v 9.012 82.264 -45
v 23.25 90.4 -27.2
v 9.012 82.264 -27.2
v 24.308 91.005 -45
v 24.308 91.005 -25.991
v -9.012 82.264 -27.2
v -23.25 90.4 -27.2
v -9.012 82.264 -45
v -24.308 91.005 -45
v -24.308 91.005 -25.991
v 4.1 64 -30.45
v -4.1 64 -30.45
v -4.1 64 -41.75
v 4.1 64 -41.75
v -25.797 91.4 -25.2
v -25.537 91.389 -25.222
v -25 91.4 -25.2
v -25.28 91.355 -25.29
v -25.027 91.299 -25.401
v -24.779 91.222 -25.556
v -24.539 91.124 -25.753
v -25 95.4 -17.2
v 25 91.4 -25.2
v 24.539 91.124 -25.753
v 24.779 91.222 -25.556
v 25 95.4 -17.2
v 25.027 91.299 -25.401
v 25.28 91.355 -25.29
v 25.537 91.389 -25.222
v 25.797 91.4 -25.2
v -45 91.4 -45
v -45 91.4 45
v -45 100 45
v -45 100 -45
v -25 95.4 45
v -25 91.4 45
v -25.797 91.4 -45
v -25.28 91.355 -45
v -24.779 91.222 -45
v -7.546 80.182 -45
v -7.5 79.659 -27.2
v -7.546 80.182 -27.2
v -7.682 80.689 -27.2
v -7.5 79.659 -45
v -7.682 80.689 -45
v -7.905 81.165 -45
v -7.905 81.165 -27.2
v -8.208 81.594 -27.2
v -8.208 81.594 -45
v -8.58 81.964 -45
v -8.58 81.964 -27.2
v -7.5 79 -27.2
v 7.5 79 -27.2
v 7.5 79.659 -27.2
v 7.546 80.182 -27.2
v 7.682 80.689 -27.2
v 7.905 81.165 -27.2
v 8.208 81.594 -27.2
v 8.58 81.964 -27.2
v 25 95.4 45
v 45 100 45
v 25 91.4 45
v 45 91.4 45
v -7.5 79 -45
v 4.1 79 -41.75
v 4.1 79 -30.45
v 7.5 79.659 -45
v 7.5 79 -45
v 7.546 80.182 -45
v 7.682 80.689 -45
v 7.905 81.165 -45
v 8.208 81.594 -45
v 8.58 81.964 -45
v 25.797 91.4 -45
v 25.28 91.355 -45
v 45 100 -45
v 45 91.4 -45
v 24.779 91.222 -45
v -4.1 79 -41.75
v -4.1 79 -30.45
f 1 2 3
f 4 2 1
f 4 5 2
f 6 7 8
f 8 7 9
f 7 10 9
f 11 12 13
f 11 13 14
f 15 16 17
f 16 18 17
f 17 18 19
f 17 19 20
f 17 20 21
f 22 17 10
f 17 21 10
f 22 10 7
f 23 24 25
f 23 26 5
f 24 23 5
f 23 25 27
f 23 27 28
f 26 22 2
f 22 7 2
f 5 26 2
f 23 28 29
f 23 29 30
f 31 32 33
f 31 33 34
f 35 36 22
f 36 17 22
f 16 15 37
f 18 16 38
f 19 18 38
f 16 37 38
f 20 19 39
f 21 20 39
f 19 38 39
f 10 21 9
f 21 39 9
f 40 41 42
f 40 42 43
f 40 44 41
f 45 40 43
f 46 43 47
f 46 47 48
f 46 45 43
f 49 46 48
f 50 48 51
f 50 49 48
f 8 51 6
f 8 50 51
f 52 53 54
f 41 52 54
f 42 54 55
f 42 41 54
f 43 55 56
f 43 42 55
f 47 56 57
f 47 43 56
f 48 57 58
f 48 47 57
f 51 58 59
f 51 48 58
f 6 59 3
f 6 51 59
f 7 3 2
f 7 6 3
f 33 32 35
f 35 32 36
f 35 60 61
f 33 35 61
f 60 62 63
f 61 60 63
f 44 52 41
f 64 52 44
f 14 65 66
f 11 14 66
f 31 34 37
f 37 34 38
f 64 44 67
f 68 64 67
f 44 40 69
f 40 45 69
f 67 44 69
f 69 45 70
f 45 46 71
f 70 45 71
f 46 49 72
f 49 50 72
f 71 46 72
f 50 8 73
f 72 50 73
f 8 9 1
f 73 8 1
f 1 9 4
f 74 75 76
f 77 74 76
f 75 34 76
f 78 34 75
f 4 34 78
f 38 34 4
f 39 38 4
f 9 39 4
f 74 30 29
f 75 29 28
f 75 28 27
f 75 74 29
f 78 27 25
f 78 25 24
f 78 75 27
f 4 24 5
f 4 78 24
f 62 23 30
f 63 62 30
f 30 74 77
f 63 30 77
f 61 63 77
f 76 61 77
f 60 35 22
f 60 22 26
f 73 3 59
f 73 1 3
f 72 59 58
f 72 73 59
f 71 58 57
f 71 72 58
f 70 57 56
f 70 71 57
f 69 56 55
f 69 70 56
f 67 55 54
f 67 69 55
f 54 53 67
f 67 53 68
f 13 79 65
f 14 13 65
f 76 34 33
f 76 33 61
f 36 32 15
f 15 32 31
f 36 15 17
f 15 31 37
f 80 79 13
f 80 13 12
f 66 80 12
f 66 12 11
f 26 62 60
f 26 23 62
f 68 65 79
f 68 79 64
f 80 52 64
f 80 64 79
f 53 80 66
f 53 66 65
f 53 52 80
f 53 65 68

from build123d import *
from OCP.BRepFilletAPI import BRepFilletAPI_MakeChamfer

# Parameters (mm, degrees)
ESQUISSE2_W             = 90
ESQUISSE2_H             = 90
BOSS_EXTRU_1_DEPTH      = 4
ESQUISSE3_W             = 9.2
ESQUISSE3_H             = 10.3
BOSS_EXTRU_2_DEPTH      = 2.4
CONG_1_R                = 1
ESQUISSE5_W             = 14.85
ESQUISSE5_H             = 90
BOSS_EXTRU_3_DEPTH      = 2.4
ESQUISSE6_W             = 7
ESQUISSE6_H             = 5
BOSS_EXTRU_4_DEPTH      = 38
ESQUISSE8_W             = 14.85
ESQUISSE8_H             = 18
BOSS_EXTRU_5_DEPTH      = 38
BOSS_EXTRU_6_REACH      = 97.814
ESQUISSE9_W             = 7
ESQUISSE9_H             = 2
CONG_1_OF_SYM_TRIE1_R   = 1
ENL_V_MAT_EXTRU_1_REACH = 111.983
ESQUISSE10_W            = 2
ESQUISSE10_H            = 18
ENL_V_MAT_EXTRU_2_REACH = 77.38
ESQUISSE11_W            = 40
ESQUISSE11_H            = 18
BOSS_EXTRU_7_REACH      = 100.203
ESQUISSE12_W            = 5
ESQUISSE12_H            = 8.6
ESQUISSE13_W            = 6.9
ESQUISSE13_H            = 7.6
BOSS_EXTRU_8_DEPTH      = 2.45
CONG_2_R                = 1
CONG_2_OF_SYM_TRIE2_R   = 1
BOSS_EXTRU_9_DEPTH      = 3
BOSS_EXTRU_9_DEPTH_BACK = 3
ESQUISSE14_W            = 90
ESQUISSE14_H            = 17.8
ESQUISSE15_W            = 15
ESQUISSE15_H            = 17.8
BOSS_EXTRU_10_DEPTH     = 44
ESQUISSE16_W            = 90
ESQUISSE16_H            = 90
BOSS_EXTRU_11_DEPTH     = 8.6
ESQUISSE20_W            = 12
ESQUISSE20_H            = 6.4
BOSS_EXTRU_13_DEPTH     = 10
ESQUISSE21_W            = 12
ESQUISSE21_H            = 6.4
BOSS_EXTRU_14_DEPTH     = 10
CONG_3_R                = 6
ENL_V_MAT_EXTRU_4_REACH = 123.7
ESQUISSE23_R            = 2.3
CONG_3_OF_SYM_TRIE3_R   = 6
ENL_V_MAT_EXTRU_5_REACH = 123.7
ESQUISSE24_R            = 1.75
ENL_V_MAT_EXTRU_6_REACH = 135.65
ESQUISSE26_R            = 1.75
ESQUISSE27_W            = 50
ESQUISSE27_H            = 4
ENL_V_MAT_EXTRU_7_DEPTH = 72.2
CHANFREIN3_SIZE         = 28.5
CHANFREIN3_SIZE2        = 9.5
CHANFREIN4_SIZE         = 10
CHANFREIN4_SIZE2        = 17.5
CHANFREIN8_START        = -45
CHANFREIN8_DEPTH        = 17.8
CHANFREIN9_SIZE         = 3
CHANFREIN9_SIZE_2       = 9
CHANFREIN10_START       = 25.930676813
CHANFREIN10_OUTLINE_W   = 40
CHANFREIN10_OUTLINE_H   = 3.16227766
CHANFREIN10_DEPTH       = 2.069323187
CONG_9_R                = 3
ESQUISSE37_R            = 4
ENL_V_MAT_EXTRU_8_DEPTH = 3
BOSS_EXTRU_15_DEPTH     = 4.8
CONG_11_R               = 3
CHANFREIN14_SIZE        = 10
CHANFREIN14_SIZE2       = 5
ESQUISSE39_W            = 110.537037217
ESQUISSE39_H            = 103.424550411
ENL_V_MAT_EXTRU_9_DEPTH = 79
ESQUISSE40_W            = 8.2
ESQUISSE40_H            = 11.3
BOSS_EXTRU_16_DEPTH     = 15


with BuildPart() as part:
    # Esquisse2 → Boss.-Extru.1 (new body)
    with BuildSketch(Plane(origin=(0, 0, 0), x_dir=(1, 0, 0), z_dir=(0, 1, 0))):
        Rectangle(ESQUISSE2_W, ESQUISSE2_H)
    extrude(amount=BOSS_EXTRU_1_DEPTH)

    # Esquisse3 → Boss.-Extru.2 (add)
    with BuildSketch(Plane(origin=(0, 4, 0), x_dir=(1, 0, 0), z_dir=(0, 1, 0))):
        with Locations((25.55, -6)):
            Rectangle(ESQUISSE3_W, ESQUISSE3_H)
    boss_extru_2 = extrude(amount=BOSS_EXTRU_2_DEPTH)

    # Congé1
    cong_1_edges = [part.edges().sort_by_distance(p)[0] for p in [
        (20.95, 5.2, 0.85),
        (20.95, 5.2, 11.15),
    ]]
    fillet(cong_1_edges, radius=CONG_1_R)

    # Esquisse5 → Boss.-Extru.3 (add)
    with BuildSketch(Plane(origin=(0, 4, 0), x_dir=(1, 0, 0), z_dir=(0, 1, 0))):
        with Locations((37.575, 0)):
            Rectangle(ESQUISSE5_W, ESQUISSE5_H)
    boss_extru_3 = extrude(amount=BOSS_EXTRU_3_DEPTH)

    # Esquisse6 → Boss.-Extru.4 (add)
    with BuildSketch(Plane(origin=(0, 6.4, 0), x_dir=(1, 0, 0), z_dir=(0, 1, 0))):
        with Locations((33.65, -42.5)):
            Rectangle(ESQUISSE6_W, ESQUISSE6_H)
    boss_extru_4 = extrude(amount=BOSS_EXTRU_4_DEPTH)

    # Esquisse8 → Boss.-Extru.5 (add)
    with BuildSketch(Plane(origin=(0, 6.4, 0), x_dir=(1, 0, 0), z_dir=(0, 1, 0))):
        with Locations((37.575, 36)):
            Rectangle(ESQUISSE8_W, ESQUISSE8_H)
    boss_extru_5 = extrude(amount=BOSS_EXTRU_5_DEPTH)

    # Esquisse9 → Boss.-Extru.6 (add, up to next)
    with BuildSketch(Plane.XY.offset(-27), mode=Mode.PRIVATE) as boss_extru_6_sk1:
        with Locations((33.65, 43.4)):
            Rectangle(ESQUISSE9_W, ESQUISSE9_H)
    boss_extru_6_tool1 = extrude(boss_extru_6_sk1.sketch, amount=BOSS_EXTRU_6_REACH, mode=Mode.PRIVATE) - part.part
    boss_extru_6 = boss_extru_6_tool1.solids().sort_by_distance((33.65, 43.4, -27))[0]
    add(boss_extru_6)

    # Symétrie1: Boss.-Extru.2, Boss.-Extru.3, Boss.-Extru.4, Boss.-Extru.5, Boss.-Extru.6 across plane
    add(boss_extru_2.mirror(Plane(origin=(0, 0, 0), x_dir=(0, 0, 1), z_dir=(1, 0, 0))))
    add(boss_extru_3.mirror(Plane(origin=(0, 0, 0), x_dir=(0, 0, 1), z_dir=(1, 0, 0))))
    add(boss_extru_4.mirror(Plane(origin=(0, 0, 0), x_dir=(0, 0, 1), z_dir=(1, 0, 0))))
    add(boss_extru_5.mirror(Plane(origin=(0, 0, 0), x_dir=(0, 0, 1), z_dir=(1, 0, 0))))
    add(boss_extru_6.mirror(Plane(origin=(0, 0, 0), x_dir=(0, 0, 1), z_dir=(1, 0, 0))))

    # Congé1 of Symétrie1
    cong_1_of_sym_trie1_edges = [part.edges().sort_by_distance(p)[0] for p in [
        (-20.95, 5.2, 0.85),
        (-20.95, 5.2, 11.15),
    ]]
    fillet(cong_1_of_sym_trie1_edges, radius=CONG_1_OF_SYM_TRIE1_R)

    # Esquisse10 → Enlèv. mat.-Extru.1 (cut, up to next)
    with BuildSketch(Plane.XY.offset(45), mode=Mode.PRIVATE) as enl_v_mat_extru_1_sk1:
        with Locations((-31.15, 26.85)):
            Rectangle(ESQUISSE10_W, ESQUISSE10_H)
    enl_v_mat_extru_1_tool1 = extrude(enl_v_mat_extru_1_sk1.sketch, amount=-ENL_V_MAT_EXTRU_1_REACH, mode=Mode.PRIVATE) & part.part
    add(enl_v_mat_extru_1_tool1.solids().sort_by_distance((-31.15, 26.85, 45))[0], mode=Mode.SUBTRACT)

    # Esquisse11 → Enlèv. mat.-Extru.2 (cut, up to next)
    with BuildSketch(Plane(origin=(0, 4, 0), x_dir=(1, 0, 0), z_dir=(0, 1, 0)), mode=Mode.PRIVATE) as enl_v_mat_extru_2_sk1:
        with Locations((0, 36)):
            Rectangle(ESQUISSE11_W, ESQUISSE11_H)
    enl_v_mat_extru_2_tool1 = extrude(enl_v_mat_extru_2_sk1.sketch, amount=-ENL_V_MAT_EXTRU_2_REACH, mode=Mode.PRIVATE) & part.part
    add(enl_v_mat_extru_2_tool1.solids().sort_by_distance((0, 4, -36))[0], mode=Mode.SUBTRACT)

    # Esquisse12 → Boss.-Extru.7 (add, up to next)
    with BuildSketch(Plane(origin=(-30.15, 0, 0), x_dir=(0, 0, -1), z_dir=(1, 0, 0)), mode=Mode.PRIVATE) as boss_extru_7_sk1:
        with Locations((29.5, 29.34)):
            Rectangle(ESQUISSE12_W, ESQUISSE12_H)
    boss_extru_7_tool1 = extrude(boss_extru_7_sk1.sketch, amount=BOSS_EXTRU_7_REACH, mode=Mode.PRIVATE) - part.part
    add(boss_extru_7_tool1.solids().sort_by_distance((-30.15, 29.34, -29.5))[0])

    # Esquisse13 → Boss.-Extru.8 (add)
    with BuildSketch(Plane.XY.offset(-27)):
        with Locations((24.4, 29.84)):
            Rectangle(ESQUISSE13_W, ESQUISSE13_H)
    boss_extru_8 = extrude(amount=BOSS_EXTRU_8_DEPTH)

    # Congé2
    cong_2_edges = [part.edges().sort_by_distance(p)[0] for p in [
        (20.95, 33.64, -25.775),
        (20.95, 26.04, -25.775),
    ]]
    fillet(cong_2_edges, radius=CONG_2_R)

    # Symétrie2: Boss.-Extru.8 across plane
    add(boss_extru_8.mirror(Plane(origin=(0, 0, 0), x_dir=(0, 0, 1), z_dir=(1, 0, 0))))

    # Congé2 of Symétrie2
    cong_2_of_sym_trie2_edges = [part.edges().sort_by_distance(p)[0] for p in [
        (-20.95, 33.64, -25.775),
        (-20.95, 26.04, -25.775),
    ]]
    fillet(cong_2_of_sym_trie2_edges, radius=CONG_2_OF_SYM_TRIE2_R)

    # Esquisse14 → Boss.-Extru.9 (add, two sides: drawn at the far end of the back side and taken through both)
    with BuildSketch(Plane(origin=(0, 44.4, 0), x_dir=(1, 0, 0), z_dir=(0, 1, 0)).offset(-BOSS_EXTRU_9_DEPTH_BACK)):
        with Locations((0, 36.1)):
            Rectangle(ESQUISSE14_W, ESQUISSE14_H)
    extrude(amount=BOSS_EXTRU_9_DEPTH + BOSS_EXTRU_9_DEPTH_BACK)

    # Esquisse15 → Boss.-Extru.10 (add)
    with BuildSketch(Plane(origin=(0, 47.4, 0), x_dir=(1, 0, 0), z_dir=(0, 1, 0))):
        with Locations((0, 36.1)):
            Rectangle(ESQUISSE15_W, ESQUISSE15_H)
    extrude(amount=BOSS_EXTRU_10_DEPTH)

    # Esquisse16 → Boss.-Extru.11 (add)
    with BuildSketch(Plane(origin=(0, 91.4, 0), x_dir=(1, 0, 0), z_dir=(0, 1, 0))):
        Rectangle(ESQUISSE16_W, ESQUISSE16_H)
    extrude(amount=BOSS_EXTRU_11_DEPTH)

    # Esquisse20 → Boss.-Extru.13 (add)
    with BuildSketch(Plane(origin=(45, 0, 0), x_dir=(0, 0, -1), z_dir=(1, 0, 0))):
        with Locations((-11, 3.2)):
            Rectangle(ESQUISSE20_W, ESQUISSE20_H)
    boss_extru_13 = extrude(amount=BOSS_EXTRU_13_DEPTH)

    # Esquisse21 → Boss.-Extru.14 (add)
    with BuildSketch(Plane(origin=(0, 0, -45), x_dir=(-1, 0, 0), z_dir=(0, 0, -1))):
        with Locations((-39, 3.2)):
            Rectangle(ESQUISSE21_W, ESQUISSE21_H)
    boss_extru_14 = extrude(amount=BOSS_EXTRU_14_DEPTH)

    # Congé3
    cong_3_edges = [part.edges().sort_by_distance(p)[0] for p in [
        (33, 3.2, -55),
        (45, 3.2, -55),
        (55, 3.2, 5),
        (55, 3.2, 17),
    ]]
    fillet(cong_3_edges, radius=CONG_3_R - 0.0001)  # a hair under: the kernel refuses the full size

    # Esquisse23 → Enlèv. mat.-Extru.4 (cut, up to next)
    with BuildSketch(Plane(origin=(0, 6.4, 0), x_dir=(1, 0, 0), z_dir=(0, 1, 0)), mode=Mode.PRIVATE) as enl_v_mat_extru_4_sk1:
        with Locations(Location((50, -11, 0), (0, 0, 270))):
            Circle(ESQUISSE23_R)
    enl_v_mat_extru_4_tool1 = extrude(enl_v_mat_extru_4_sk1.sketch, amount=-ENL_V_MAT_EXTRU_4_REACH, mode=Mode.PRIVATE) & part.part
    # Esquisse23 → Enlèv. mat.-Extru.4 (cut, up to next)
    with BuildSketch(Plane(origin=(0, 6.4, 0), x_dir=(1, 0, 0), z_dir=(0, 1, 0)), mode=Mode.PRIVATE) as enl_v_mat_extru_4_sk2:
        with Locations(Location((39, 50, 0), (0, 0, 270))):
            Circle(ESQUISSE23_R)
    enl_v_mat_extru_4_tool2 = extrude(enl_v_mat_extru_4_sk2.sketch, amount=-ENL_V_MAT_EXTRU_4_REACH, mode=Mode.PRIVATE) & part.part
    enl_v_mat_extru_4_1 = enl_v_mat_extru_4_tool1.solids().sort_by_distance((50, 6.4, 11))[0]
    add(enl_v_mat_extru_4_1, mode=Mode.SUBTRACT)
    enl_v_mat_extru_4_2 = enl_v_mat_extru_4_tool2.solids().sort_by_distance((39, 6.4, -50))[0]
    add(enl_v_mat_extru_4_2, mode=Mode.SUBTRACT)
    enl_v_mat_extru_4 = enl_v_mat_extru_4_1 + enl_v_mat_extru_4_2  # Enlèv. mat.-Extru.4 as one shape, for the pattern or mirror that repeats it

    # Symétrie3: Boss.-Extru.13, Boss.-Extru.14, Enlèv. mat.-Extru.4 across plane
    add(boss_extru_13.mirror(Plane(origin=(0, 0, 0), x_dir=(0, 0, 1), z_dir=(1, 0, 0))))
    add(boss_extru_14.mirror(Plane(origin=(0, 0, 0), x_dir=(0, 0, 1), z_dir=(1, 0, 0))))
    add(enl_v_mat_extru_4.mirror(Plane(origin=(0, 0, 0), x_dir=(0, 0, 1), z_dir=(1, 0, 0))), mode=Mode.SUBTRACT)

    # Congé3 of Symétrie3
    cong_3_of_sym_trie3_edges = [part.edges().sort_by_distance(p)[0] for p in [
        (-33, 3.2, -55),
        (-45, 3.2, -55),
        (-55, 3.2, 5),
        (-55, 3.2, 17),
    ]]
    fillet(cong_3_of_sym_trie3_edges, radius=CONG_3_OF_SYM_TRIE3_R - 0.0001)  # a hair under: the kernel refuses the full size

    # Esquisse24 → Enlèv. mat.-Extru.5 (cut, up to next)
    with BuildSketch(Plane(origin=(0, 6.4, 0), x_dir=(1, 0, 0), z_dir=(0, 1, 0)), mode=Mode.PRIVATE) as enl_v_mat_extru_5_sk1:
        with Locations(Location((25.45, -6, 0), (0, 0, 270))):
            Circle(ESQUISSE24_R)
    enl_v_mat_extru_5_tool1 = extrude(enl_v_mat_extru_5_sk1.sketch, amount=-ENL_V_MAT_EXTRU_5_REACH, mode=Mode.PRIVATE) & part.part
    enl_v_mat_extru_5 = enl_v_mat_extru_5_tool1.solids().sort_by_distance((25.45, 6.4, 6))[0]
    add(enl_v_mat_extru_5, mode=Mode.SUBTRACT)

    # Esquisse26 → Enlèv. mat.-Extru.6 (cut, up to next)
    with BuildSketch(Plane.XY.offset(-24.55), mode=Mode.PRIVATE) as enl_v_mat_extru_6_sk1:
        with Locations((25.55, 28.44)):
            Circle(ESQUISSE26_R)
    enl_v_mat_extru_6_tool1 = extrude(enl_v_mat_extru_6_sk1.sketch, amount=-ENL_V_MAT_EXTRU_6_REACH, mode=Mode.PRIVATE) & part.part
    enl_v_mat_extru_6 = enl_v_mat_extru_6_tool1.solids().sort_by_distance((25.55, 28.44, -24.55))[0]
    add(enl_v_mat_extru_6, mode=Mode.SUBTRACT)

    # Symétrie5: Enlèv. mat.-Extru.5, Enlèv. mat.-Extru.6 across plane
    add(enl_v_mat_extru_5.mirror(Plane(origin=(0, 0, 0), x_dir=(0, 0, 1), z_dir=(1, 0, 0))), mode=Mode.SUBTRACT)
    add(enl_v_mat_extru_6.mirror(Plane(origin=(0, 0, 0), x_dir=(0, 0, 1), z_dir=(1, 0, 0))), mode=Mode.SUBTRACT)

    # Esquisse27 → Enlèv. mat.-Extru.7 (cut)
    with BuildSketch(Plane.XY.offset(45)):
        with Locations((0, 93.4)):
            Rectangle(ESQUISSE27_W, ESQUISSE27_H)
    extrude(amount=-ENL_V_MAT_EXTRU_7_DEPTH, mode=Mode.SUBTRACT)

    # Chanfrein3: one chamfer whose edges measure the first distance from different faces: ONE call of the kernel's chamfer builder (chamfer() names one face for all edges)
    chanfrein3_edges_1 = [part.edges().sort_by_distance(p)[0] for p in [
        (-7.5, 47.4, -36.1),
    ]]
    chanfrein3_side_1 = [part.faces().sort_by_distance(p)[0] for p in [
        (-26.25, 47.4, -36.1),
    ]]
    chanfrein3_edges_2 = [part.edges().sort_by_distance(p)[0] for p in [
        (7.5, 47.4, -36.1),
    ]]
    chanfrein3_side_2 = [part.faces().sort_by_distance(p)[0] for p in [
        (26.25, 47.4, -36.1),
    ]]
    chanfrein3 = BRepFilletAPI_MakeChamfer(part.part.solid().wrapped)
    for e in chanfrein3_edges_1:
        chanfrein3.Add(CHANFREIN3_SIZE, CHANFREIN3_SIZE2, e.wrapped, chanfrein3_side_1[0].wrapped)  # the first distance lies on this face
    for e in chanfrein3_edges_2:
        chanfrein3.Add(CHANFREIN3_SIZE, CHANFREIN3_SIZE2, e.wrapped, chanfrein3_side_2[0].wrapped)  # the first distance lies on this face
    add(Compound.cast(chanfrein3.Shape()), mode=Mode.REPLACE)

    # Chanfrein4: one chamfer whose edges measure the first distance from different faces: ONE call of the kernel's chamfer builder (chamfer() names one face for all edges)
    chanfrein4_edges_1 = [part.edges().sort_by_distance(p)[0] for p in [
        (7.5, 91.4, -36.1),
    ]]
    chanfrein4_side_1 = [part.faces().sort_by_distance(p)[0] for p in [
        (7.5, 74.15, -36.1),
    ]]
    chanfrein4_edges_2 = [part.edges().sort_by_distance(p)[0] for p in [
        (-7.5, 91.4, -36.1),
    ]]
    chanfrein4_side_2 = [part.faces().sort_by_distance(p)[0] for p in [
        (-7.5, 74.15, -36.1),
    ]]
    chanfrein4 = BRepFilletAPI_MakeChamfer(part.part.solid().wrapped)
    for e in chanfrein4_edges_1:
        chanfrein4.Add(CHANFREIN4_SIZE, CHANFREIN4_SIZE2, e.wrapped, chanfrein4_side_1[0].wrapped)  # the first distance lies on this face
    for e in chanfrein4_edges_2:
        chanfrein4.Add(CHANFREIN4_SIZE, CHANFREIN4_SIZE2, e.wrapped, chanfrein4_side_2[0].wrapped)  # the first distance lies on this face
    add(Compound.cast(chanfrein4.Shape()), mode=Mode.REPLACE)

    # Chanfrein8: read off the stored shape, not the designer's step
    # Chanfrein8 outline → Chanfrein8 (add)
    with BuildSketch(Plane.XY.offset(CHANFREIN8_START)):
        Polygon((30.15, 31.35), (30.15, 41.4), (0, 41.4), align=None)
    extrude(amount=CHANFREIN8_DEPTH)

    # Chanfrein9
    chanfrein9_edges_1 = [part.edges().sort_by_distance(p)[0] for p in [
        (45, 47.4, -36.1),
    ]]
    chanfrein9_side_1 = [part.faces().sort_by_distance(p)[0] for p in [
        (45, 47.34, -36.1),
    ]]
    chanfrein9_edges_2 = [part.edges().sort_by_distance(p)[0] for p in [
        (-45, 47.4, -36.1),
    ]]
    chanfrein9_side_2 = [part.faces().sort_by_distance(p)[0] for p in [
        (-44.94, 47.4, -36.1),
    ]]
    chanfrein9 = BRepFilletAPI_MakeChamfer(part.part.solid().wrapped)
    for e in chanfrein9_edges_1:
        chanfrein9.Add(CHANFREIN9_SIZE - 0.0001, CHANFREIN9_SIZE_2 - 0.0001, e.wrapped, chanfrein9_side_1[0].wrapped)
    for e in chanfrein9_edges_2:
        chanfrein9.Add(CHANFREIN9_SIZE_2 - 0.0001, CHANFREIN9_SIZE - 0.0001, e.wrapped, chanfrein9_side_2[0].wrapped)
    add(Compound.cast(chanfrein9.Shape()), mode=Mode.REPLACE)  # a hair under: the kernel refuses the full size

    # Chanfrein10: read off the stored shape, not the designer's step
    # Chanfrein10 outline → Chanfrein10 (cut)
    with BuildSketch(Plane(origin=(0, 0, 0), x_dir=(1, 0, 0), z_dir=(0, 0.316227766016835, -0.9486832980505149)).offset(CHANFREIN10_START)):
        with Locations((0, 6.008327554)):
            Rectangle(CHANFREIN10_OUTLINE_W, CHANFREIN10_OUTLINE_H)
    extrude(amount=CHANFREIN10_DEPTH, mode=Mode.SUBTRACT)

    # Congé9
    cong_9_edges = [part.edges().sort_by_distance(p)[0] for p in [
        (-33.65, 44.4, 45),
        (-33.65, 6.4, 40),
        (-37.575, 6.4, -27),
        (-33.65, 42.4, 40),
        (-33.65, 42.4, -27),
        (33.65, 6.4, 40),
        (33.65, 44.4, 45),
        (37.575, 6.4, -27),
        (33.65, 42.4, 40),
        (33.65, 42.4, -27),
    ]]
    fillet(cong_9_edges, radius=CONG_9_R)

    # Chanfrein13
    # the kernel refuses this chamfer: 31.5, 10.5 mm, written as the material it adds along each edge
    with BuildSketch(Plane(origin=(-30.15, 41.4, -27.2), x_dir=(0, -1, 0), z_dir=(0, 0, -1))) as chanfrein13_piece_1:
        with BuildLine():
            Line((10.898446985, 1.195340956), (-0.398446985, -32.695340956))
            Line((-0.398446985, -32.695340956), (-1.028446985, -32.695340956))
            ThreePointArc((-1.028446985, -32.695340956), (-0.63, -16.347670478), (-0.63, 0))
            Line((-0.63, 0), (0, 0.63))
            ThreePointArc((0, 0.63), (5.449223493, 0.63), (10.898446985, 1.825340956))
            Line((10.898446985, 1.825340956), (10.898446985, 1.195340956))
        make_face()
    extrude(amount=17.8)

    # Esquisse37 → Enlèv. mat.-Extru.8 (cut)
    with BuildSketch(Plane.XZ):
        with Locations(Location((-25.45, 6, 0), (0, 0, 270))):
            Circle(ESQUISSE37_R)
        with Locations(Location((25.45, 6, 0), (0, 0, 270))):
            Circle(ESQUISSE37_R)
    extrude(amount=-ENL_V_MAT_EXTRU_8_DEPTH, mode=Mode.SUBTRACT)

    # Esquisse38 → Boss.-Extru.15 (add)
    with BuildSketch(Plane.XY.offset(-27.2)):
        Polygon((0.675, 41.175), (-21.95, 33.64), (23.28, 33.64), align=None)
    extrude(amount=-BOSS_EXTRU_15_DEPTH)

    # Congé11
    cong_11_edges = [part.edges().sort_by_distance(p)[0] for p in [
        (7.5, 56.9, -36.1),
        (-7.5, 56.9, -36.1),
        (-25, 91.4, -36.1),
        (-7.5, 81.4, -36.1),
        (25, 91.4, -36.1),
        (7.5, 81.4, -36.1),
        (30.15, 31.35, -38.5),
        (-30.15, 30.9, -38.5),
        (0.675, 41.175, -38.5),
    ]]
    fillet(cong_11_edges, radius=CONG_11_R)

    # Chanfrein14
    chanfrein14_edges = [part.edges().sort_by_distance(p)[0] for p in [
        (0, 95.4, -27.2),
    ]]
    chanfrein14_side = [part.faces().sort_by_distance(p)[0] for p in [
        (0, 95.4, 8.9),
    ]]
    chamfer(chanfrein14_edges, length=CHANFREIN14_SIZE, length2=CHANFREIN14_SIZE2, reference=chanfrein14_side[0])

    # Esquisse39 → Enlèv. mat.-Extru.9 (cut)
    with BuildSketch(Plane.XZ):
        with Locations((-0.268518609, -4.614943927)):
            Rectangle(ESQUISSE39_W, ESQUISSE39_H)
    extrude(amount=-ENL_V_MAT_EXTRU_9_DEPTH, mode=Mode.SUBTRACT)

    # Esquisse40 → Boss.-Extru.16 (add)
    with BuildSketch(Plane.XZ.offset(-79)):
        with Locations((0, -36.1)):
            Rectangle(ESQUISSE40_W, ESQUISSE40_H)
    extrude(amount=BOSS_EXTRU_16_DEPTH)


solid = part.part
